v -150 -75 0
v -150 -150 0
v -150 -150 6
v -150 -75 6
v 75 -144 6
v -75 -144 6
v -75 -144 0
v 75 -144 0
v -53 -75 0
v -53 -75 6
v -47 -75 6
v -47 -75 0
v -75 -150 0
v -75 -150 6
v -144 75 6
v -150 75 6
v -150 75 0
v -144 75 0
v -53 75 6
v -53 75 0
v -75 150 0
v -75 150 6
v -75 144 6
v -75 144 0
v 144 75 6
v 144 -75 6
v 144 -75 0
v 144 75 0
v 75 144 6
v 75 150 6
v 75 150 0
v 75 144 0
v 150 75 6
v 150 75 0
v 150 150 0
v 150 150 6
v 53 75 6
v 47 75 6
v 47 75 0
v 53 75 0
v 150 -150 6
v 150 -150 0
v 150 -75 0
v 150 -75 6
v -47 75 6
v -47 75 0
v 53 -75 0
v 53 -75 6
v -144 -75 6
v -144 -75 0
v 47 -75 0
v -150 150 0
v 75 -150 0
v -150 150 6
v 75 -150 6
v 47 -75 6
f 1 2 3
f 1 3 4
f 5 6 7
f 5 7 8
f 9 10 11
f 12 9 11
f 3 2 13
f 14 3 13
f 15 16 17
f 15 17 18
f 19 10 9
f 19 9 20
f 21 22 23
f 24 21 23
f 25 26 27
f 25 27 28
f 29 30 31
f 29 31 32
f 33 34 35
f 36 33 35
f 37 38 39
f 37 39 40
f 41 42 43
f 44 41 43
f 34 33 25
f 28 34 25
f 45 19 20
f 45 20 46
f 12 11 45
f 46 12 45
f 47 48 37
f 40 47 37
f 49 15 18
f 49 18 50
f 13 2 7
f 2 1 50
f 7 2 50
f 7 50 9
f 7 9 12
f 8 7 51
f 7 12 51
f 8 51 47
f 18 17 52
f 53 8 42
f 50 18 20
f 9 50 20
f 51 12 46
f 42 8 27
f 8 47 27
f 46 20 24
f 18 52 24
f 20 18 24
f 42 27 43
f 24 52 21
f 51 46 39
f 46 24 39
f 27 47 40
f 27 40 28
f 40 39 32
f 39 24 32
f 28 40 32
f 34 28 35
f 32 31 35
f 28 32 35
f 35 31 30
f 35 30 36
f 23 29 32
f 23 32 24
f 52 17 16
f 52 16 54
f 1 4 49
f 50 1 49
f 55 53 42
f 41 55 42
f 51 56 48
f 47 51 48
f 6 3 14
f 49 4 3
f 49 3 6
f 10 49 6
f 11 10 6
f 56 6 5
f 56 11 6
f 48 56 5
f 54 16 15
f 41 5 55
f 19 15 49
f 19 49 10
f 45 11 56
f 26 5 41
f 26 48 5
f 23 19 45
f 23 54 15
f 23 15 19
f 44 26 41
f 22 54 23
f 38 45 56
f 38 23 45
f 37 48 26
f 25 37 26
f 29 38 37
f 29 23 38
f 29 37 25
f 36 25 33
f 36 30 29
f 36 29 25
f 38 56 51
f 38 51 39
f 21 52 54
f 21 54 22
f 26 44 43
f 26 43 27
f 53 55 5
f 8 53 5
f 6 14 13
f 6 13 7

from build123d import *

# Parameters (mm, degrees)
F0_W            = 300
F0_H            = 300
F1_DEPTH        = 6
F2_W            = 150
F2_H            = 6
F3_DEPTH        = 6
F3_COPIES_COUNT = 4
F5_W            = 6
F5_H            = 150
F6_DEPTH        = 6


# Not quite as in the source:
# - a pattern or mirror of a feature is missing from the dataset's text; its kind, count and spacing are read off the source's solid


with BuildPart() as f1:
    # F0 (on Top) → F1 (new body)
    with BuildSketch(Plane.XY):
        Rectangle(F0_W, F0_H)
    extrude(amount=F1_DEPTH)

    # F2 (on face) → F3 (cut, through all)
    with BuildSketch(Plane.XY.offset(6)):
        with Locations((0, -147)):
            Rectangle(F2_W, F2_H)
    f3 = extrude(amount=-F3_DEPTH, mode=Mode.SUBTRACT)

    # F3_copies: F3 ×4 about axis
    f3_copies_axis = Axis((0, 0, 0), (0, 0, 1))
    for i in range(1, F3_COPIES_COUNT):
        add(f3.rotate(f3_copies_axis, i * 360 / F3_COPIES_COUNT), mode=Mode.SUBTRACT)

    # F5 (on face) → F6 (cut, through all)
    with BuildSketch(Plane.XY.offset(6)):
        with Locations((-50, 0)):
            Rectangle(F5_W, F5_H)
        with Locations((50, 0)):
            Rectangle(F5_W, F5_H)
    extrude(amount=-F6_DEPTH, mode=Mode.SUBTRACT)


solid = f1.part
